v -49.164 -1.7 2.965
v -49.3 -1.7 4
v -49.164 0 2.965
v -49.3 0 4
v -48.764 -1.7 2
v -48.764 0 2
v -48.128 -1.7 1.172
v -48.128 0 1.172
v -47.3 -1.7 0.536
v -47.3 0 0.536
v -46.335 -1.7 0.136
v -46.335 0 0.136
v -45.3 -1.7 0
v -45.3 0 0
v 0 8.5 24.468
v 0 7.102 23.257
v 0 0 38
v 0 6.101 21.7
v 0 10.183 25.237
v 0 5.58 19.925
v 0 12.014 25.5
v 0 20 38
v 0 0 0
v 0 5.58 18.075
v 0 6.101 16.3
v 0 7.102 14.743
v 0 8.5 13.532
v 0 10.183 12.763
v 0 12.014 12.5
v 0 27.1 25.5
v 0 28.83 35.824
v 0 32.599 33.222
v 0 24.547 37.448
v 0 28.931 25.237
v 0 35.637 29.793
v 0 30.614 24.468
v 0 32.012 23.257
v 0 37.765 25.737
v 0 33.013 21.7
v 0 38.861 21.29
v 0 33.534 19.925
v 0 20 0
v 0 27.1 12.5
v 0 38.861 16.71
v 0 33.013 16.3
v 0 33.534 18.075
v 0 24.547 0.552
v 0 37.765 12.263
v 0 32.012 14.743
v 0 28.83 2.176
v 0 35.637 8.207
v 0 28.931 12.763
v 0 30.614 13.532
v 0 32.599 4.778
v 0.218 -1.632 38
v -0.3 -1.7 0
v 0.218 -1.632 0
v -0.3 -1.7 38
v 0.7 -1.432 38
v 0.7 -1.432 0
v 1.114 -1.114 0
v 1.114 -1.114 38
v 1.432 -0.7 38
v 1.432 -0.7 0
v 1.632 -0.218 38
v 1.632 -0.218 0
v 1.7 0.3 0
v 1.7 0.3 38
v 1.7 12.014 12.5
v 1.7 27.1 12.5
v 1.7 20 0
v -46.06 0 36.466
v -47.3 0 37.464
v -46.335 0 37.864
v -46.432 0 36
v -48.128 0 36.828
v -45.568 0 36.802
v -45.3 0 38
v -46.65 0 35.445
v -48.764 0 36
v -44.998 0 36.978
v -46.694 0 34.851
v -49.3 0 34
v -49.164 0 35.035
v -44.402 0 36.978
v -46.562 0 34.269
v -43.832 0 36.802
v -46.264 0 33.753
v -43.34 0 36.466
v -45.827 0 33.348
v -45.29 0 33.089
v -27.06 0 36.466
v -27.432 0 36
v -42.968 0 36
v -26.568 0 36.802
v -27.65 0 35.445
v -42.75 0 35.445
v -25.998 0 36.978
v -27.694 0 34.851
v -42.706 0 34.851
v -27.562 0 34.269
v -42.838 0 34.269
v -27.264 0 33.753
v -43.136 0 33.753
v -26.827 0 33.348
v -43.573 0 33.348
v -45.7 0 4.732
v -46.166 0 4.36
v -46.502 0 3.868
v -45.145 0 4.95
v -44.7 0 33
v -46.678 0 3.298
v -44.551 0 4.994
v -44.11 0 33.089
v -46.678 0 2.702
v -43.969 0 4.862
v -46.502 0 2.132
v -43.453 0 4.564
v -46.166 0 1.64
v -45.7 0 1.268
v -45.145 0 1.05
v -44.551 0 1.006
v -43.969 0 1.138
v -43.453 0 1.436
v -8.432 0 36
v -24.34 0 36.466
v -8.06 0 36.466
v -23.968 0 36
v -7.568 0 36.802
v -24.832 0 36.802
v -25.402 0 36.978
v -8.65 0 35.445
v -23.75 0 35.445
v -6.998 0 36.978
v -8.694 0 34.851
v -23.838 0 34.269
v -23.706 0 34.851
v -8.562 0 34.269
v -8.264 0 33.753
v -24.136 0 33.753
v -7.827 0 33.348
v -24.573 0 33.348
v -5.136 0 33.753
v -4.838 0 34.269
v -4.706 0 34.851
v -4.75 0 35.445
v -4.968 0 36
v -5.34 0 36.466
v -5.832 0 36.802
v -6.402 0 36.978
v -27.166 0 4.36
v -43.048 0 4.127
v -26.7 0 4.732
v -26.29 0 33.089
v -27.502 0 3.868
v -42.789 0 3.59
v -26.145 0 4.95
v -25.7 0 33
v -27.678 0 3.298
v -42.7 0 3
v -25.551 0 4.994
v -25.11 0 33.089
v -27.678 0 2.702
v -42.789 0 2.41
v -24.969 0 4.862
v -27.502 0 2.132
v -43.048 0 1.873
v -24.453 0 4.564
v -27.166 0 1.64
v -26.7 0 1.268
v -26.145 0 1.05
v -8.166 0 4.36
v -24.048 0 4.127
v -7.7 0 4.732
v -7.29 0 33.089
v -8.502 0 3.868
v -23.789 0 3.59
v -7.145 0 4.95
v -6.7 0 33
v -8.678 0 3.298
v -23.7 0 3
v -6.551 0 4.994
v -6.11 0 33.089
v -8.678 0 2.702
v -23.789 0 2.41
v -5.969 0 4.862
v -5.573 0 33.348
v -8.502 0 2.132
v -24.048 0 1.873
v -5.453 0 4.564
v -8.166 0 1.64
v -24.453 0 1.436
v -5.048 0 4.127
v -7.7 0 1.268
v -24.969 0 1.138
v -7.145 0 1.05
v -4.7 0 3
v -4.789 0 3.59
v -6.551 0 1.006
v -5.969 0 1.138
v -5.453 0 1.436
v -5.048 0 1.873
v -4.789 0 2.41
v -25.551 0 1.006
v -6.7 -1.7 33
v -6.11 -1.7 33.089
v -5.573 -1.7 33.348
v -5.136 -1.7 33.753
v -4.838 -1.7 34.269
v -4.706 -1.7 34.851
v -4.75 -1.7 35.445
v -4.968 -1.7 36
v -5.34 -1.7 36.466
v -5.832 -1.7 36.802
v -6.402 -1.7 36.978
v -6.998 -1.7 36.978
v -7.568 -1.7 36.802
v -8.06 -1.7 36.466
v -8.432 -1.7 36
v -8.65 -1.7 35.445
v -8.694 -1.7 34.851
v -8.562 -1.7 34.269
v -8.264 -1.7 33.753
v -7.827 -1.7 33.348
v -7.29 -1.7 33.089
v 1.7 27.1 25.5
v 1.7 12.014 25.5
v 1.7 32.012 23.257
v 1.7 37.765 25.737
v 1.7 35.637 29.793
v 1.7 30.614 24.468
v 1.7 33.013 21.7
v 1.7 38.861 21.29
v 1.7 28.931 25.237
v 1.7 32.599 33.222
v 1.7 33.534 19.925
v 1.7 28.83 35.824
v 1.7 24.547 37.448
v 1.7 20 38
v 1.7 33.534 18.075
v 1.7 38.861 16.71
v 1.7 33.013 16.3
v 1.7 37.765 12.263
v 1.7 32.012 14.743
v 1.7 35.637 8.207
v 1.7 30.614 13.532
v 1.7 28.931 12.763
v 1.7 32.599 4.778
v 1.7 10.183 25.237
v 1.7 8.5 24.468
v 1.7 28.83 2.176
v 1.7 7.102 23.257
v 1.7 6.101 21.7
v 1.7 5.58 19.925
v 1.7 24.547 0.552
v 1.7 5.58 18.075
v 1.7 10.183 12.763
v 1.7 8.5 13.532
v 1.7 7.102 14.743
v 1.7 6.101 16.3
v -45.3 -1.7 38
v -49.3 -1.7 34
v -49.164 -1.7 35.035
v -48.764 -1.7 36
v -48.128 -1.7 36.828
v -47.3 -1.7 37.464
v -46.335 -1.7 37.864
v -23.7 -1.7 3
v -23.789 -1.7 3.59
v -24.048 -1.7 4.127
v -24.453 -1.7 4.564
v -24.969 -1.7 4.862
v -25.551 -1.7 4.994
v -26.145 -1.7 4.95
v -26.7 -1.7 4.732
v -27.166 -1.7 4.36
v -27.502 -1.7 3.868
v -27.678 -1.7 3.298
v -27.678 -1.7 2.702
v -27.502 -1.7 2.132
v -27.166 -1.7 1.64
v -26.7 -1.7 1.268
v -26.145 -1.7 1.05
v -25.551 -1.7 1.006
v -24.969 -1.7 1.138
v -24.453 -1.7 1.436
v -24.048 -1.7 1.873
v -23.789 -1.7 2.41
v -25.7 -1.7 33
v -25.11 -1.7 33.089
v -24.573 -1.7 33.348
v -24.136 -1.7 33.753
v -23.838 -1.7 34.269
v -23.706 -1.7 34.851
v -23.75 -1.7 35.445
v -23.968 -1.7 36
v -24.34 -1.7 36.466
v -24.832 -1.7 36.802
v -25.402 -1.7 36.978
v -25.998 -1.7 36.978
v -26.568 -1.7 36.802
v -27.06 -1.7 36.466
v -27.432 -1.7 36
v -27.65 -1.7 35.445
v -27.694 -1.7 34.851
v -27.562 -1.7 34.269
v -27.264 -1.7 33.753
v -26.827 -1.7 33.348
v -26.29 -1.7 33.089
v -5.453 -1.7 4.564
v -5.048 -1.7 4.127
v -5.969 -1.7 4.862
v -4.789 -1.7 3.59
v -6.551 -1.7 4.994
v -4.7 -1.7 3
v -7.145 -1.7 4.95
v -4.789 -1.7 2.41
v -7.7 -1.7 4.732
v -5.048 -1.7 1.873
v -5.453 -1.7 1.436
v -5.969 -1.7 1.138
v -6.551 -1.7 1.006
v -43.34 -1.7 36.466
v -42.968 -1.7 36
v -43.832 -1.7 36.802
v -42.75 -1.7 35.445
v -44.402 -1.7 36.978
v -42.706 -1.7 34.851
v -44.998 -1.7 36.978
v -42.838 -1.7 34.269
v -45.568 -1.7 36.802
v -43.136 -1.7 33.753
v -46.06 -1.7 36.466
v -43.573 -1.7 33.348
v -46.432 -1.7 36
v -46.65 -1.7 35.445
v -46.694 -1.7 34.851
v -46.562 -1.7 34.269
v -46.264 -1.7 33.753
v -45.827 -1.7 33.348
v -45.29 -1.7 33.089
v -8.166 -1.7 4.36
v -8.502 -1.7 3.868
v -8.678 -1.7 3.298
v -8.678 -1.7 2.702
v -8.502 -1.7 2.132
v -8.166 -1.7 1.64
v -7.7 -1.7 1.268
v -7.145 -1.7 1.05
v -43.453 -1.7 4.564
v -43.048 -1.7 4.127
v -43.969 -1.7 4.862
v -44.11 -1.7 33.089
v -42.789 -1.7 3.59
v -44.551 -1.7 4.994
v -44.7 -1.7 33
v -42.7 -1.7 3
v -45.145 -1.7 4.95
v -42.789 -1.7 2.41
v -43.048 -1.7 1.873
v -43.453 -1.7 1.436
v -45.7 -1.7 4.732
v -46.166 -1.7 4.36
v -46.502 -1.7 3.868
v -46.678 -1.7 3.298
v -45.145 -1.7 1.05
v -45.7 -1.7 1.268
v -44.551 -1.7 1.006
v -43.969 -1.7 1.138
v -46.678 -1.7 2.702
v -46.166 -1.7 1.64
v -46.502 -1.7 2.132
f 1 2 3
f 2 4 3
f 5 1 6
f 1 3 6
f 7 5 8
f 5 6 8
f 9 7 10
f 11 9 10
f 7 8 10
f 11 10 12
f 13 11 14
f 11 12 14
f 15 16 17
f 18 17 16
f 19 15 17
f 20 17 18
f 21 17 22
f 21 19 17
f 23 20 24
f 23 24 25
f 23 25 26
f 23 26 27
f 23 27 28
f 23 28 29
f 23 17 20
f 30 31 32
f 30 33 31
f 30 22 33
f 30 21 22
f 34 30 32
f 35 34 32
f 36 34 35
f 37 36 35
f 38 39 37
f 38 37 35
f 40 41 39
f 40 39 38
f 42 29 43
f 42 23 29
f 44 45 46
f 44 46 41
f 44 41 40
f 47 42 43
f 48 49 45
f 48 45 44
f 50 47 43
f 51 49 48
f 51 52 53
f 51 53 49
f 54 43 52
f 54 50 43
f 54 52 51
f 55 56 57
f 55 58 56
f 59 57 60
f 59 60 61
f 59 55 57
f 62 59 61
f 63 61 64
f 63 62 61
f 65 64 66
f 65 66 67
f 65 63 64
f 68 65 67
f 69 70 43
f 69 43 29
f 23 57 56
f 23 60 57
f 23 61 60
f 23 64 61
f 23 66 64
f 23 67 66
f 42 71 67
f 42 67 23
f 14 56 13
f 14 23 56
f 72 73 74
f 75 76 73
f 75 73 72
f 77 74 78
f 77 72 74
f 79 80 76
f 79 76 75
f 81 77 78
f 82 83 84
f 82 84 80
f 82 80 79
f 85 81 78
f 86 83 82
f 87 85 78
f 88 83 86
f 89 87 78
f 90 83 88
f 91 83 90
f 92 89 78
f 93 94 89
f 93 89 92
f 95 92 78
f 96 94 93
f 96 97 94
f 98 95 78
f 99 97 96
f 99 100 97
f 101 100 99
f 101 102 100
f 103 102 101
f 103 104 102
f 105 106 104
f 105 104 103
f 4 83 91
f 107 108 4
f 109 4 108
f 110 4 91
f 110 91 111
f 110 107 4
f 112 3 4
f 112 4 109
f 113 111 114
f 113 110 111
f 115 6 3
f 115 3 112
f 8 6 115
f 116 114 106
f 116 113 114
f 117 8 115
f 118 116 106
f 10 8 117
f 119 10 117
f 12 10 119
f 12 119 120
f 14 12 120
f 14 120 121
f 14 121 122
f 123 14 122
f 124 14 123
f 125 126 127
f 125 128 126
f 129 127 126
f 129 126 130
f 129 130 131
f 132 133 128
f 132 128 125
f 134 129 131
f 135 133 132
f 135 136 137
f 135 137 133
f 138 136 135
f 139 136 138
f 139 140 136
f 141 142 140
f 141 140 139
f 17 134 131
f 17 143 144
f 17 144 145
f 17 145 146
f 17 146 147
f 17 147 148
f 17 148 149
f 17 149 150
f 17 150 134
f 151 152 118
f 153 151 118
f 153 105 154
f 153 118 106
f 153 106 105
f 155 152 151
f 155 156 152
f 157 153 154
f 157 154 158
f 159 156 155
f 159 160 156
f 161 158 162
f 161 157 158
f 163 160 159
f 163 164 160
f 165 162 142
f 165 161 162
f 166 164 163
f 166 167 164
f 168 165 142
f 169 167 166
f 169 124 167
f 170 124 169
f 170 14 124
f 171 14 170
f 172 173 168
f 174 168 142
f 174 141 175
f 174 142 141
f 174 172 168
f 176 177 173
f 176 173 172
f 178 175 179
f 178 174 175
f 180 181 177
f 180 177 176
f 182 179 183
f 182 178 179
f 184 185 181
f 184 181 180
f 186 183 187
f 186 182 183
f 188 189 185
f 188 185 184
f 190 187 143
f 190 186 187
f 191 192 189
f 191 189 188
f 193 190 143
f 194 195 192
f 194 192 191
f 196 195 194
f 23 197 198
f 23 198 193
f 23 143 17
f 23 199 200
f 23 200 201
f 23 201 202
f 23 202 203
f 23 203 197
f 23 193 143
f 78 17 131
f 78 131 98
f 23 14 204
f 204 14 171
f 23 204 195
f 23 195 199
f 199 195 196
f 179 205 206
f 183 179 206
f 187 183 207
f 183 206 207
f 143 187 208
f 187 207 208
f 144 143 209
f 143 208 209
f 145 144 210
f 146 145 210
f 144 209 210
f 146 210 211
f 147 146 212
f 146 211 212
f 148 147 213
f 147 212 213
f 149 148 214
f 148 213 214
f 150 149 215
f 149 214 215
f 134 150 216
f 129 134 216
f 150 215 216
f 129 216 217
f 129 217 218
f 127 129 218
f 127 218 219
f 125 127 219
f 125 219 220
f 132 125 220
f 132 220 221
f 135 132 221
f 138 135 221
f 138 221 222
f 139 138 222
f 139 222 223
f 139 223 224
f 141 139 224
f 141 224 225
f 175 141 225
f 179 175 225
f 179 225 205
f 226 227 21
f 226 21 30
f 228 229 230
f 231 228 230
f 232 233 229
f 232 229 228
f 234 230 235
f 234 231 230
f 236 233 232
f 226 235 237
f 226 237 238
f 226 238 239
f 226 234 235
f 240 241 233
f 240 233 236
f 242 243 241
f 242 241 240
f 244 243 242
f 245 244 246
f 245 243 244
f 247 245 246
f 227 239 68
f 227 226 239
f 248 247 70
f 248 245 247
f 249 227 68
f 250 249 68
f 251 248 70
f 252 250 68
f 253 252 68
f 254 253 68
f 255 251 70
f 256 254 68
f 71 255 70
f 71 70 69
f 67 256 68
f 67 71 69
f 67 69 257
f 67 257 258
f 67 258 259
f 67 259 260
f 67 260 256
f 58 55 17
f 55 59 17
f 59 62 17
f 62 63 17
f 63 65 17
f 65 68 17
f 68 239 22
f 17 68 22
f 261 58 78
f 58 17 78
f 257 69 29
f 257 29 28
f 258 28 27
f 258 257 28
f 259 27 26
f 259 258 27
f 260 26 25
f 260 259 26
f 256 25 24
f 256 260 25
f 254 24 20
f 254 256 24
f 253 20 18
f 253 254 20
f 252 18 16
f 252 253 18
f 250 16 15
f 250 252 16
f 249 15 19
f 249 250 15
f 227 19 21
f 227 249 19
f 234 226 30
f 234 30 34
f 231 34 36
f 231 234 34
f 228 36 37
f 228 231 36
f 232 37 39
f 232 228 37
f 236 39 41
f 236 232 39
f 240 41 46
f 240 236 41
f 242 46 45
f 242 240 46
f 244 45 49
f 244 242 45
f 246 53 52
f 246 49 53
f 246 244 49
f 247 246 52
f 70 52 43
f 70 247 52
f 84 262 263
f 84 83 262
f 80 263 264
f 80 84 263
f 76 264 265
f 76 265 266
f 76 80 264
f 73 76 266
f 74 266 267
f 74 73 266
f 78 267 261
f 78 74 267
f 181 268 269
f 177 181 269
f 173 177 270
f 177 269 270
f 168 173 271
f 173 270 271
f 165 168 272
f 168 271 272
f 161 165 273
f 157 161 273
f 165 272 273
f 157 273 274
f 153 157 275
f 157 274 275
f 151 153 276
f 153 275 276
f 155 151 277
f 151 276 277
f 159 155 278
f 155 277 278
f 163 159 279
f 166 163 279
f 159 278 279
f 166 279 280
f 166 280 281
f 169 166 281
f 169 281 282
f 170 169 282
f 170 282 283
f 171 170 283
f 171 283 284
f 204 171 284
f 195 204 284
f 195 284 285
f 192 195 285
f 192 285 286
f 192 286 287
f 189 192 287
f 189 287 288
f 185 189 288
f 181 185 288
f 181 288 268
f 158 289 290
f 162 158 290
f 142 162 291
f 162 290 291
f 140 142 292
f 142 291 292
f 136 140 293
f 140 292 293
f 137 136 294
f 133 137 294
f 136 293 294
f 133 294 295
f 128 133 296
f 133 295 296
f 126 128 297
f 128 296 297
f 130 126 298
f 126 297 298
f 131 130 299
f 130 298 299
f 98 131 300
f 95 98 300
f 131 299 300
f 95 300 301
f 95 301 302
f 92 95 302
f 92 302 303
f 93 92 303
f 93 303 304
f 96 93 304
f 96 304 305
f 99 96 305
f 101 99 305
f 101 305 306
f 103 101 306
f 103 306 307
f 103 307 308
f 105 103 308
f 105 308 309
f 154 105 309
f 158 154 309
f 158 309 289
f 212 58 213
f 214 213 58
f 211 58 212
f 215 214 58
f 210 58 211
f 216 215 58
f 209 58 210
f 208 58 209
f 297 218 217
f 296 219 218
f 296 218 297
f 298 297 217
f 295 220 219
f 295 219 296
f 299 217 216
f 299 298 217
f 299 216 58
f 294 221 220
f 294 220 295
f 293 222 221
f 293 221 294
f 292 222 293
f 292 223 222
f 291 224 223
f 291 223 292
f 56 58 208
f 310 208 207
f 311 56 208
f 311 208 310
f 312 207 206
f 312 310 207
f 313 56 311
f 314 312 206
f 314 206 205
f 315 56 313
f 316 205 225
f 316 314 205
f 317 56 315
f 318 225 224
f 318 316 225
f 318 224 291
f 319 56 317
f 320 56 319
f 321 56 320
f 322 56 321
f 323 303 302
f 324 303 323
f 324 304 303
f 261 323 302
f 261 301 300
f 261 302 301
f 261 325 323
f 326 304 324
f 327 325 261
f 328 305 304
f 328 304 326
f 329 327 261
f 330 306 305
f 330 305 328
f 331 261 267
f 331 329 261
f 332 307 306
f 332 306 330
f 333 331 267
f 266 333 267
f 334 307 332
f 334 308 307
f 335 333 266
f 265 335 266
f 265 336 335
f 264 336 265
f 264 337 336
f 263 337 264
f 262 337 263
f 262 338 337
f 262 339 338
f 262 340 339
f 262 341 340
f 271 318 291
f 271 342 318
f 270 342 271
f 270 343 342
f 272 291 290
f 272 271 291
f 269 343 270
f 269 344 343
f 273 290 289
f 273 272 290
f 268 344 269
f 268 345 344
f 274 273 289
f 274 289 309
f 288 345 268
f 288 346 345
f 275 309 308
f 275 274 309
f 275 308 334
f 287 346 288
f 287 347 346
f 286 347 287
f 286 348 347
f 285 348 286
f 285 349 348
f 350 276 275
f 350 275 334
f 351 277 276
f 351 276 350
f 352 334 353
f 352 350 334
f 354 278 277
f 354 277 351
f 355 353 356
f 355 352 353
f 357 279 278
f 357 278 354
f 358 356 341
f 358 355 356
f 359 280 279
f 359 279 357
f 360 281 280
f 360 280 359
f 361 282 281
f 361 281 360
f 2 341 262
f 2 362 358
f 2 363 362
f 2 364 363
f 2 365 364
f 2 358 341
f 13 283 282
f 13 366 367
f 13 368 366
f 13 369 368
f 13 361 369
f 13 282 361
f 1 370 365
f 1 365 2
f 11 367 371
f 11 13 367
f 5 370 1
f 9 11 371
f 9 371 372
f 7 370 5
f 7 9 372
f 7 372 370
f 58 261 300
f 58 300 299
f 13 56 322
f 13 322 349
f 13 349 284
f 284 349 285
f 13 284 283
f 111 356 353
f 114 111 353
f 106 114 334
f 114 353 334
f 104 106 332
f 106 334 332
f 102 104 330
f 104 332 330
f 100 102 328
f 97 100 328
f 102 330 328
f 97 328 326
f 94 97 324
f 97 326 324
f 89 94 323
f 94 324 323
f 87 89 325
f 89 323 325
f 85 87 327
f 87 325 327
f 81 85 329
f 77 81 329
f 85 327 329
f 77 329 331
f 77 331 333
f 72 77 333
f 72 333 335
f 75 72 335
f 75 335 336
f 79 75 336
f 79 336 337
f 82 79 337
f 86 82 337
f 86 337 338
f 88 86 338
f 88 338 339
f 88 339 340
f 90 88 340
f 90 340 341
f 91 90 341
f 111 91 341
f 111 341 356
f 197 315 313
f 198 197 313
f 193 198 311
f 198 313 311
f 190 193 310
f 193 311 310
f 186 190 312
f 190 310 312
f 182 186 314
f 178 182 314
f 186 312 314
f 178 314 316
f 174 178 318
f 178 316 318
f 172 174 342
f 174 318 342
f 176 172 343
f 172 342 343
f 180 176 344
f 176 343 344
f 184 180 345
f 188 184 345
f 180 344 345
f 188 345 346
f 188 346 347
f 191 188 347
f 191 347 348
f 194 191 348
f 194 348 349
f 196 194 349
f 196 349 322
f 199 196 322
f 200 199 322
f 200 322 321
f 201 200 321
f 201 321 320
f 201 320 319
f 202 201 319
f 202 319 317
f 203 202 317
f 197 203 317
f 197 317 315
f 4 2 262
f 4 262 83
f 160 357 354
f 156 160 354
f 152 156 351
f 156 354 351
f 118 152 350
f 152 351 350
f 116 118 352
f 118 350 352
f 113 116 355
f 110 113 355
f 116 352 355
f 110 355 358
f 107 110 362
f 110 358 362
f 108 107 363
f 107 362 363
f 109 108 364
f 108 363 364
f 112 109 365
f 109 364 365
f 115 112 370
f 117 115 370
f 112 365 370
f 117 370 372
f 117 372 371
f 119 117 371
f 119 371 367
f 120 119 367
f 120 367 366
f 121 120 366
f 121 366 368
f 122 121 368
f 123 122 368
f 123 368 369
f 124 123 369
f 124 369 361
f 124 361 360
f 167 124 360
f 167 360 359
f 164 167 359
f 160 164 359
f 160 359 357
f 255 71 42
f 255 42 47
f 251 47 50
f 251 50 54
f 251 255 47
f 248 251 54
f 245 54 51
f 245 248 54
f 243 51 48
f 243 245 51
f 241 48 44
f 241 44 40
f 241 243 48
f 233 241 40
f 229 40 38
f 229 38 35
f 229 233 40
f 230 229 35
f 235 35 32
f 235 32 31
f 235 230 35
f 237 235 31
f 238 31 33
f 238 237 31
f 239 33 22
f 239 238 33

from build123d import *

# Parameters (mm, degrees)
BOSS_EXTRUDE1_DEPTH = 38
FILLET1_R           = 4
FILLET2_R           = 4
FILLET3_RADIUS      = 19
FILLET3_LENGTH      = 1.7
CUT_EXTRUDE1_DEPTH  = 38
SKETCH3_R           = 2
CUT_EXTRUDE2_DEPTH  = 38
FILLET4_R           = 2


with BuildPart() as part:
    # Sketch1 → Boss-Extrude1 (new body)
    with BuildSketch(Plane.XY):
        Polygon((0, 0), (0, 39), (1.7, 39), (1.7, -1.7), (-49.3, -1.7), (-49.3, 0), align=None)
    extrude(amount=BOSS_EXTRUDE1_DEPTH)

    # Fillet1
    fillet1_edges = [part.edges().sort_by_distance(p)[0] for p in [
        (-49.3, -0.85, 0),
    ]]
    fillet(fillet1_edges, radius=FILLET1_R)

    # Fillet2
    fillet2_edges = [part.edges().sort_by_distance(p)[0] for p in [
        (-49.3, -0.85, 38),
    ]]
    fillet(fillet2_edges, radius=FILLET2_R)

    # Fillet3: full round fillet: the end face becomes a half cylinder, R = half its width
    fillet3_face = Plane((0.85, 39, 19), x_dir=(1, 0, 0), z_dir=(0, 1, 0))  # on the end face: x along it, z out of the body
    fillet3_slab = fillet3_face.offset(-FILLET3_RADIUS / 2) * Box(FILLET3_LENGTH, 2 * FILLET3_RADIUS, FILLET3_RADIUS, mode=Mode.PRIVATE)  # the body's end, R deep
    fillet3_round = Plane((0.85, 20, 19), x_dir=(0, 1, 0), z_dir=(1, 0, 0)) * Cylinder(FILLET3_RADIUS, FILLET3_LENGTH, mode=Mode.PRIVATE)  # its axis R under the face
    add(fillet3_slab - fillet3_round, mode=Mode.SUBTRACT)

    # Sketch2 → Cut-Extrude1 (cut)
    with BuildSketch(Plane(origin=(1.7, 0, 0), x_dir=(0, 0, -1), z_dir=(1, 0, 0))):
        with BuildLine():
            Line((-25.5, 12.013917936), (-25.5, 27.1))
            ThreePointArc((-25.5, 27.1), (-19, 33.6), (-12.5, 27.1))
            Line((-12.5, 27.1), (-12.5, 12.013917936))
            ThreePointArc((-12.5, 12.013917936), (-19, 5.513917936), (-25.5, 12.013917936))
        make_face()
    extrude(amount=-CUT_EXTRUDE1_DEPTH, mode=Mode.SUBTRACT)

    # Sketch3 → Cut-Extrude2 (cut)
    with BuildSketch(Plane(origin=(0, -1.7, 0), x_dir=(-1, 0, 0), z_dir=(0, -1, 0))):
        with Locations(Location((44.7, -3, 0), (0, 0, 180))):
            Circle(SKETCH3_R)
        with Locations(Location((25.7, -3, 0), (0, 0, 180))):
            Circle(SKETCH3_R)
        with Locations(Location((6.7, -3, 0), (0, 0, 180))):
            Circle(SKETCH3_R)
        with Locations(Location((6.7, -35, 0), (0, 0, 90))):
            Circle(SKETCH3_R)
        with Locations(Location((25.7, -35, 0), (0, 0, 90))):
            Circle(SKETCH3_R)
        with Locations(Location((44.7, -35, 0), (0, 0, 90))):
            Circle(SKETCH3_R)
    extrude(amount=-CUT_EXTRUDE2_DEPTH, mode=Mode.SUBTRACT)

    # Fillet4
    fillet4_edges = [part.edges().sort_by_distance(p)[0] for p in [
        (1.7, -1.7, 19),
    ]]
    fillet(fillet4_edges, radius=FILLET4_R)


solid = part.part
